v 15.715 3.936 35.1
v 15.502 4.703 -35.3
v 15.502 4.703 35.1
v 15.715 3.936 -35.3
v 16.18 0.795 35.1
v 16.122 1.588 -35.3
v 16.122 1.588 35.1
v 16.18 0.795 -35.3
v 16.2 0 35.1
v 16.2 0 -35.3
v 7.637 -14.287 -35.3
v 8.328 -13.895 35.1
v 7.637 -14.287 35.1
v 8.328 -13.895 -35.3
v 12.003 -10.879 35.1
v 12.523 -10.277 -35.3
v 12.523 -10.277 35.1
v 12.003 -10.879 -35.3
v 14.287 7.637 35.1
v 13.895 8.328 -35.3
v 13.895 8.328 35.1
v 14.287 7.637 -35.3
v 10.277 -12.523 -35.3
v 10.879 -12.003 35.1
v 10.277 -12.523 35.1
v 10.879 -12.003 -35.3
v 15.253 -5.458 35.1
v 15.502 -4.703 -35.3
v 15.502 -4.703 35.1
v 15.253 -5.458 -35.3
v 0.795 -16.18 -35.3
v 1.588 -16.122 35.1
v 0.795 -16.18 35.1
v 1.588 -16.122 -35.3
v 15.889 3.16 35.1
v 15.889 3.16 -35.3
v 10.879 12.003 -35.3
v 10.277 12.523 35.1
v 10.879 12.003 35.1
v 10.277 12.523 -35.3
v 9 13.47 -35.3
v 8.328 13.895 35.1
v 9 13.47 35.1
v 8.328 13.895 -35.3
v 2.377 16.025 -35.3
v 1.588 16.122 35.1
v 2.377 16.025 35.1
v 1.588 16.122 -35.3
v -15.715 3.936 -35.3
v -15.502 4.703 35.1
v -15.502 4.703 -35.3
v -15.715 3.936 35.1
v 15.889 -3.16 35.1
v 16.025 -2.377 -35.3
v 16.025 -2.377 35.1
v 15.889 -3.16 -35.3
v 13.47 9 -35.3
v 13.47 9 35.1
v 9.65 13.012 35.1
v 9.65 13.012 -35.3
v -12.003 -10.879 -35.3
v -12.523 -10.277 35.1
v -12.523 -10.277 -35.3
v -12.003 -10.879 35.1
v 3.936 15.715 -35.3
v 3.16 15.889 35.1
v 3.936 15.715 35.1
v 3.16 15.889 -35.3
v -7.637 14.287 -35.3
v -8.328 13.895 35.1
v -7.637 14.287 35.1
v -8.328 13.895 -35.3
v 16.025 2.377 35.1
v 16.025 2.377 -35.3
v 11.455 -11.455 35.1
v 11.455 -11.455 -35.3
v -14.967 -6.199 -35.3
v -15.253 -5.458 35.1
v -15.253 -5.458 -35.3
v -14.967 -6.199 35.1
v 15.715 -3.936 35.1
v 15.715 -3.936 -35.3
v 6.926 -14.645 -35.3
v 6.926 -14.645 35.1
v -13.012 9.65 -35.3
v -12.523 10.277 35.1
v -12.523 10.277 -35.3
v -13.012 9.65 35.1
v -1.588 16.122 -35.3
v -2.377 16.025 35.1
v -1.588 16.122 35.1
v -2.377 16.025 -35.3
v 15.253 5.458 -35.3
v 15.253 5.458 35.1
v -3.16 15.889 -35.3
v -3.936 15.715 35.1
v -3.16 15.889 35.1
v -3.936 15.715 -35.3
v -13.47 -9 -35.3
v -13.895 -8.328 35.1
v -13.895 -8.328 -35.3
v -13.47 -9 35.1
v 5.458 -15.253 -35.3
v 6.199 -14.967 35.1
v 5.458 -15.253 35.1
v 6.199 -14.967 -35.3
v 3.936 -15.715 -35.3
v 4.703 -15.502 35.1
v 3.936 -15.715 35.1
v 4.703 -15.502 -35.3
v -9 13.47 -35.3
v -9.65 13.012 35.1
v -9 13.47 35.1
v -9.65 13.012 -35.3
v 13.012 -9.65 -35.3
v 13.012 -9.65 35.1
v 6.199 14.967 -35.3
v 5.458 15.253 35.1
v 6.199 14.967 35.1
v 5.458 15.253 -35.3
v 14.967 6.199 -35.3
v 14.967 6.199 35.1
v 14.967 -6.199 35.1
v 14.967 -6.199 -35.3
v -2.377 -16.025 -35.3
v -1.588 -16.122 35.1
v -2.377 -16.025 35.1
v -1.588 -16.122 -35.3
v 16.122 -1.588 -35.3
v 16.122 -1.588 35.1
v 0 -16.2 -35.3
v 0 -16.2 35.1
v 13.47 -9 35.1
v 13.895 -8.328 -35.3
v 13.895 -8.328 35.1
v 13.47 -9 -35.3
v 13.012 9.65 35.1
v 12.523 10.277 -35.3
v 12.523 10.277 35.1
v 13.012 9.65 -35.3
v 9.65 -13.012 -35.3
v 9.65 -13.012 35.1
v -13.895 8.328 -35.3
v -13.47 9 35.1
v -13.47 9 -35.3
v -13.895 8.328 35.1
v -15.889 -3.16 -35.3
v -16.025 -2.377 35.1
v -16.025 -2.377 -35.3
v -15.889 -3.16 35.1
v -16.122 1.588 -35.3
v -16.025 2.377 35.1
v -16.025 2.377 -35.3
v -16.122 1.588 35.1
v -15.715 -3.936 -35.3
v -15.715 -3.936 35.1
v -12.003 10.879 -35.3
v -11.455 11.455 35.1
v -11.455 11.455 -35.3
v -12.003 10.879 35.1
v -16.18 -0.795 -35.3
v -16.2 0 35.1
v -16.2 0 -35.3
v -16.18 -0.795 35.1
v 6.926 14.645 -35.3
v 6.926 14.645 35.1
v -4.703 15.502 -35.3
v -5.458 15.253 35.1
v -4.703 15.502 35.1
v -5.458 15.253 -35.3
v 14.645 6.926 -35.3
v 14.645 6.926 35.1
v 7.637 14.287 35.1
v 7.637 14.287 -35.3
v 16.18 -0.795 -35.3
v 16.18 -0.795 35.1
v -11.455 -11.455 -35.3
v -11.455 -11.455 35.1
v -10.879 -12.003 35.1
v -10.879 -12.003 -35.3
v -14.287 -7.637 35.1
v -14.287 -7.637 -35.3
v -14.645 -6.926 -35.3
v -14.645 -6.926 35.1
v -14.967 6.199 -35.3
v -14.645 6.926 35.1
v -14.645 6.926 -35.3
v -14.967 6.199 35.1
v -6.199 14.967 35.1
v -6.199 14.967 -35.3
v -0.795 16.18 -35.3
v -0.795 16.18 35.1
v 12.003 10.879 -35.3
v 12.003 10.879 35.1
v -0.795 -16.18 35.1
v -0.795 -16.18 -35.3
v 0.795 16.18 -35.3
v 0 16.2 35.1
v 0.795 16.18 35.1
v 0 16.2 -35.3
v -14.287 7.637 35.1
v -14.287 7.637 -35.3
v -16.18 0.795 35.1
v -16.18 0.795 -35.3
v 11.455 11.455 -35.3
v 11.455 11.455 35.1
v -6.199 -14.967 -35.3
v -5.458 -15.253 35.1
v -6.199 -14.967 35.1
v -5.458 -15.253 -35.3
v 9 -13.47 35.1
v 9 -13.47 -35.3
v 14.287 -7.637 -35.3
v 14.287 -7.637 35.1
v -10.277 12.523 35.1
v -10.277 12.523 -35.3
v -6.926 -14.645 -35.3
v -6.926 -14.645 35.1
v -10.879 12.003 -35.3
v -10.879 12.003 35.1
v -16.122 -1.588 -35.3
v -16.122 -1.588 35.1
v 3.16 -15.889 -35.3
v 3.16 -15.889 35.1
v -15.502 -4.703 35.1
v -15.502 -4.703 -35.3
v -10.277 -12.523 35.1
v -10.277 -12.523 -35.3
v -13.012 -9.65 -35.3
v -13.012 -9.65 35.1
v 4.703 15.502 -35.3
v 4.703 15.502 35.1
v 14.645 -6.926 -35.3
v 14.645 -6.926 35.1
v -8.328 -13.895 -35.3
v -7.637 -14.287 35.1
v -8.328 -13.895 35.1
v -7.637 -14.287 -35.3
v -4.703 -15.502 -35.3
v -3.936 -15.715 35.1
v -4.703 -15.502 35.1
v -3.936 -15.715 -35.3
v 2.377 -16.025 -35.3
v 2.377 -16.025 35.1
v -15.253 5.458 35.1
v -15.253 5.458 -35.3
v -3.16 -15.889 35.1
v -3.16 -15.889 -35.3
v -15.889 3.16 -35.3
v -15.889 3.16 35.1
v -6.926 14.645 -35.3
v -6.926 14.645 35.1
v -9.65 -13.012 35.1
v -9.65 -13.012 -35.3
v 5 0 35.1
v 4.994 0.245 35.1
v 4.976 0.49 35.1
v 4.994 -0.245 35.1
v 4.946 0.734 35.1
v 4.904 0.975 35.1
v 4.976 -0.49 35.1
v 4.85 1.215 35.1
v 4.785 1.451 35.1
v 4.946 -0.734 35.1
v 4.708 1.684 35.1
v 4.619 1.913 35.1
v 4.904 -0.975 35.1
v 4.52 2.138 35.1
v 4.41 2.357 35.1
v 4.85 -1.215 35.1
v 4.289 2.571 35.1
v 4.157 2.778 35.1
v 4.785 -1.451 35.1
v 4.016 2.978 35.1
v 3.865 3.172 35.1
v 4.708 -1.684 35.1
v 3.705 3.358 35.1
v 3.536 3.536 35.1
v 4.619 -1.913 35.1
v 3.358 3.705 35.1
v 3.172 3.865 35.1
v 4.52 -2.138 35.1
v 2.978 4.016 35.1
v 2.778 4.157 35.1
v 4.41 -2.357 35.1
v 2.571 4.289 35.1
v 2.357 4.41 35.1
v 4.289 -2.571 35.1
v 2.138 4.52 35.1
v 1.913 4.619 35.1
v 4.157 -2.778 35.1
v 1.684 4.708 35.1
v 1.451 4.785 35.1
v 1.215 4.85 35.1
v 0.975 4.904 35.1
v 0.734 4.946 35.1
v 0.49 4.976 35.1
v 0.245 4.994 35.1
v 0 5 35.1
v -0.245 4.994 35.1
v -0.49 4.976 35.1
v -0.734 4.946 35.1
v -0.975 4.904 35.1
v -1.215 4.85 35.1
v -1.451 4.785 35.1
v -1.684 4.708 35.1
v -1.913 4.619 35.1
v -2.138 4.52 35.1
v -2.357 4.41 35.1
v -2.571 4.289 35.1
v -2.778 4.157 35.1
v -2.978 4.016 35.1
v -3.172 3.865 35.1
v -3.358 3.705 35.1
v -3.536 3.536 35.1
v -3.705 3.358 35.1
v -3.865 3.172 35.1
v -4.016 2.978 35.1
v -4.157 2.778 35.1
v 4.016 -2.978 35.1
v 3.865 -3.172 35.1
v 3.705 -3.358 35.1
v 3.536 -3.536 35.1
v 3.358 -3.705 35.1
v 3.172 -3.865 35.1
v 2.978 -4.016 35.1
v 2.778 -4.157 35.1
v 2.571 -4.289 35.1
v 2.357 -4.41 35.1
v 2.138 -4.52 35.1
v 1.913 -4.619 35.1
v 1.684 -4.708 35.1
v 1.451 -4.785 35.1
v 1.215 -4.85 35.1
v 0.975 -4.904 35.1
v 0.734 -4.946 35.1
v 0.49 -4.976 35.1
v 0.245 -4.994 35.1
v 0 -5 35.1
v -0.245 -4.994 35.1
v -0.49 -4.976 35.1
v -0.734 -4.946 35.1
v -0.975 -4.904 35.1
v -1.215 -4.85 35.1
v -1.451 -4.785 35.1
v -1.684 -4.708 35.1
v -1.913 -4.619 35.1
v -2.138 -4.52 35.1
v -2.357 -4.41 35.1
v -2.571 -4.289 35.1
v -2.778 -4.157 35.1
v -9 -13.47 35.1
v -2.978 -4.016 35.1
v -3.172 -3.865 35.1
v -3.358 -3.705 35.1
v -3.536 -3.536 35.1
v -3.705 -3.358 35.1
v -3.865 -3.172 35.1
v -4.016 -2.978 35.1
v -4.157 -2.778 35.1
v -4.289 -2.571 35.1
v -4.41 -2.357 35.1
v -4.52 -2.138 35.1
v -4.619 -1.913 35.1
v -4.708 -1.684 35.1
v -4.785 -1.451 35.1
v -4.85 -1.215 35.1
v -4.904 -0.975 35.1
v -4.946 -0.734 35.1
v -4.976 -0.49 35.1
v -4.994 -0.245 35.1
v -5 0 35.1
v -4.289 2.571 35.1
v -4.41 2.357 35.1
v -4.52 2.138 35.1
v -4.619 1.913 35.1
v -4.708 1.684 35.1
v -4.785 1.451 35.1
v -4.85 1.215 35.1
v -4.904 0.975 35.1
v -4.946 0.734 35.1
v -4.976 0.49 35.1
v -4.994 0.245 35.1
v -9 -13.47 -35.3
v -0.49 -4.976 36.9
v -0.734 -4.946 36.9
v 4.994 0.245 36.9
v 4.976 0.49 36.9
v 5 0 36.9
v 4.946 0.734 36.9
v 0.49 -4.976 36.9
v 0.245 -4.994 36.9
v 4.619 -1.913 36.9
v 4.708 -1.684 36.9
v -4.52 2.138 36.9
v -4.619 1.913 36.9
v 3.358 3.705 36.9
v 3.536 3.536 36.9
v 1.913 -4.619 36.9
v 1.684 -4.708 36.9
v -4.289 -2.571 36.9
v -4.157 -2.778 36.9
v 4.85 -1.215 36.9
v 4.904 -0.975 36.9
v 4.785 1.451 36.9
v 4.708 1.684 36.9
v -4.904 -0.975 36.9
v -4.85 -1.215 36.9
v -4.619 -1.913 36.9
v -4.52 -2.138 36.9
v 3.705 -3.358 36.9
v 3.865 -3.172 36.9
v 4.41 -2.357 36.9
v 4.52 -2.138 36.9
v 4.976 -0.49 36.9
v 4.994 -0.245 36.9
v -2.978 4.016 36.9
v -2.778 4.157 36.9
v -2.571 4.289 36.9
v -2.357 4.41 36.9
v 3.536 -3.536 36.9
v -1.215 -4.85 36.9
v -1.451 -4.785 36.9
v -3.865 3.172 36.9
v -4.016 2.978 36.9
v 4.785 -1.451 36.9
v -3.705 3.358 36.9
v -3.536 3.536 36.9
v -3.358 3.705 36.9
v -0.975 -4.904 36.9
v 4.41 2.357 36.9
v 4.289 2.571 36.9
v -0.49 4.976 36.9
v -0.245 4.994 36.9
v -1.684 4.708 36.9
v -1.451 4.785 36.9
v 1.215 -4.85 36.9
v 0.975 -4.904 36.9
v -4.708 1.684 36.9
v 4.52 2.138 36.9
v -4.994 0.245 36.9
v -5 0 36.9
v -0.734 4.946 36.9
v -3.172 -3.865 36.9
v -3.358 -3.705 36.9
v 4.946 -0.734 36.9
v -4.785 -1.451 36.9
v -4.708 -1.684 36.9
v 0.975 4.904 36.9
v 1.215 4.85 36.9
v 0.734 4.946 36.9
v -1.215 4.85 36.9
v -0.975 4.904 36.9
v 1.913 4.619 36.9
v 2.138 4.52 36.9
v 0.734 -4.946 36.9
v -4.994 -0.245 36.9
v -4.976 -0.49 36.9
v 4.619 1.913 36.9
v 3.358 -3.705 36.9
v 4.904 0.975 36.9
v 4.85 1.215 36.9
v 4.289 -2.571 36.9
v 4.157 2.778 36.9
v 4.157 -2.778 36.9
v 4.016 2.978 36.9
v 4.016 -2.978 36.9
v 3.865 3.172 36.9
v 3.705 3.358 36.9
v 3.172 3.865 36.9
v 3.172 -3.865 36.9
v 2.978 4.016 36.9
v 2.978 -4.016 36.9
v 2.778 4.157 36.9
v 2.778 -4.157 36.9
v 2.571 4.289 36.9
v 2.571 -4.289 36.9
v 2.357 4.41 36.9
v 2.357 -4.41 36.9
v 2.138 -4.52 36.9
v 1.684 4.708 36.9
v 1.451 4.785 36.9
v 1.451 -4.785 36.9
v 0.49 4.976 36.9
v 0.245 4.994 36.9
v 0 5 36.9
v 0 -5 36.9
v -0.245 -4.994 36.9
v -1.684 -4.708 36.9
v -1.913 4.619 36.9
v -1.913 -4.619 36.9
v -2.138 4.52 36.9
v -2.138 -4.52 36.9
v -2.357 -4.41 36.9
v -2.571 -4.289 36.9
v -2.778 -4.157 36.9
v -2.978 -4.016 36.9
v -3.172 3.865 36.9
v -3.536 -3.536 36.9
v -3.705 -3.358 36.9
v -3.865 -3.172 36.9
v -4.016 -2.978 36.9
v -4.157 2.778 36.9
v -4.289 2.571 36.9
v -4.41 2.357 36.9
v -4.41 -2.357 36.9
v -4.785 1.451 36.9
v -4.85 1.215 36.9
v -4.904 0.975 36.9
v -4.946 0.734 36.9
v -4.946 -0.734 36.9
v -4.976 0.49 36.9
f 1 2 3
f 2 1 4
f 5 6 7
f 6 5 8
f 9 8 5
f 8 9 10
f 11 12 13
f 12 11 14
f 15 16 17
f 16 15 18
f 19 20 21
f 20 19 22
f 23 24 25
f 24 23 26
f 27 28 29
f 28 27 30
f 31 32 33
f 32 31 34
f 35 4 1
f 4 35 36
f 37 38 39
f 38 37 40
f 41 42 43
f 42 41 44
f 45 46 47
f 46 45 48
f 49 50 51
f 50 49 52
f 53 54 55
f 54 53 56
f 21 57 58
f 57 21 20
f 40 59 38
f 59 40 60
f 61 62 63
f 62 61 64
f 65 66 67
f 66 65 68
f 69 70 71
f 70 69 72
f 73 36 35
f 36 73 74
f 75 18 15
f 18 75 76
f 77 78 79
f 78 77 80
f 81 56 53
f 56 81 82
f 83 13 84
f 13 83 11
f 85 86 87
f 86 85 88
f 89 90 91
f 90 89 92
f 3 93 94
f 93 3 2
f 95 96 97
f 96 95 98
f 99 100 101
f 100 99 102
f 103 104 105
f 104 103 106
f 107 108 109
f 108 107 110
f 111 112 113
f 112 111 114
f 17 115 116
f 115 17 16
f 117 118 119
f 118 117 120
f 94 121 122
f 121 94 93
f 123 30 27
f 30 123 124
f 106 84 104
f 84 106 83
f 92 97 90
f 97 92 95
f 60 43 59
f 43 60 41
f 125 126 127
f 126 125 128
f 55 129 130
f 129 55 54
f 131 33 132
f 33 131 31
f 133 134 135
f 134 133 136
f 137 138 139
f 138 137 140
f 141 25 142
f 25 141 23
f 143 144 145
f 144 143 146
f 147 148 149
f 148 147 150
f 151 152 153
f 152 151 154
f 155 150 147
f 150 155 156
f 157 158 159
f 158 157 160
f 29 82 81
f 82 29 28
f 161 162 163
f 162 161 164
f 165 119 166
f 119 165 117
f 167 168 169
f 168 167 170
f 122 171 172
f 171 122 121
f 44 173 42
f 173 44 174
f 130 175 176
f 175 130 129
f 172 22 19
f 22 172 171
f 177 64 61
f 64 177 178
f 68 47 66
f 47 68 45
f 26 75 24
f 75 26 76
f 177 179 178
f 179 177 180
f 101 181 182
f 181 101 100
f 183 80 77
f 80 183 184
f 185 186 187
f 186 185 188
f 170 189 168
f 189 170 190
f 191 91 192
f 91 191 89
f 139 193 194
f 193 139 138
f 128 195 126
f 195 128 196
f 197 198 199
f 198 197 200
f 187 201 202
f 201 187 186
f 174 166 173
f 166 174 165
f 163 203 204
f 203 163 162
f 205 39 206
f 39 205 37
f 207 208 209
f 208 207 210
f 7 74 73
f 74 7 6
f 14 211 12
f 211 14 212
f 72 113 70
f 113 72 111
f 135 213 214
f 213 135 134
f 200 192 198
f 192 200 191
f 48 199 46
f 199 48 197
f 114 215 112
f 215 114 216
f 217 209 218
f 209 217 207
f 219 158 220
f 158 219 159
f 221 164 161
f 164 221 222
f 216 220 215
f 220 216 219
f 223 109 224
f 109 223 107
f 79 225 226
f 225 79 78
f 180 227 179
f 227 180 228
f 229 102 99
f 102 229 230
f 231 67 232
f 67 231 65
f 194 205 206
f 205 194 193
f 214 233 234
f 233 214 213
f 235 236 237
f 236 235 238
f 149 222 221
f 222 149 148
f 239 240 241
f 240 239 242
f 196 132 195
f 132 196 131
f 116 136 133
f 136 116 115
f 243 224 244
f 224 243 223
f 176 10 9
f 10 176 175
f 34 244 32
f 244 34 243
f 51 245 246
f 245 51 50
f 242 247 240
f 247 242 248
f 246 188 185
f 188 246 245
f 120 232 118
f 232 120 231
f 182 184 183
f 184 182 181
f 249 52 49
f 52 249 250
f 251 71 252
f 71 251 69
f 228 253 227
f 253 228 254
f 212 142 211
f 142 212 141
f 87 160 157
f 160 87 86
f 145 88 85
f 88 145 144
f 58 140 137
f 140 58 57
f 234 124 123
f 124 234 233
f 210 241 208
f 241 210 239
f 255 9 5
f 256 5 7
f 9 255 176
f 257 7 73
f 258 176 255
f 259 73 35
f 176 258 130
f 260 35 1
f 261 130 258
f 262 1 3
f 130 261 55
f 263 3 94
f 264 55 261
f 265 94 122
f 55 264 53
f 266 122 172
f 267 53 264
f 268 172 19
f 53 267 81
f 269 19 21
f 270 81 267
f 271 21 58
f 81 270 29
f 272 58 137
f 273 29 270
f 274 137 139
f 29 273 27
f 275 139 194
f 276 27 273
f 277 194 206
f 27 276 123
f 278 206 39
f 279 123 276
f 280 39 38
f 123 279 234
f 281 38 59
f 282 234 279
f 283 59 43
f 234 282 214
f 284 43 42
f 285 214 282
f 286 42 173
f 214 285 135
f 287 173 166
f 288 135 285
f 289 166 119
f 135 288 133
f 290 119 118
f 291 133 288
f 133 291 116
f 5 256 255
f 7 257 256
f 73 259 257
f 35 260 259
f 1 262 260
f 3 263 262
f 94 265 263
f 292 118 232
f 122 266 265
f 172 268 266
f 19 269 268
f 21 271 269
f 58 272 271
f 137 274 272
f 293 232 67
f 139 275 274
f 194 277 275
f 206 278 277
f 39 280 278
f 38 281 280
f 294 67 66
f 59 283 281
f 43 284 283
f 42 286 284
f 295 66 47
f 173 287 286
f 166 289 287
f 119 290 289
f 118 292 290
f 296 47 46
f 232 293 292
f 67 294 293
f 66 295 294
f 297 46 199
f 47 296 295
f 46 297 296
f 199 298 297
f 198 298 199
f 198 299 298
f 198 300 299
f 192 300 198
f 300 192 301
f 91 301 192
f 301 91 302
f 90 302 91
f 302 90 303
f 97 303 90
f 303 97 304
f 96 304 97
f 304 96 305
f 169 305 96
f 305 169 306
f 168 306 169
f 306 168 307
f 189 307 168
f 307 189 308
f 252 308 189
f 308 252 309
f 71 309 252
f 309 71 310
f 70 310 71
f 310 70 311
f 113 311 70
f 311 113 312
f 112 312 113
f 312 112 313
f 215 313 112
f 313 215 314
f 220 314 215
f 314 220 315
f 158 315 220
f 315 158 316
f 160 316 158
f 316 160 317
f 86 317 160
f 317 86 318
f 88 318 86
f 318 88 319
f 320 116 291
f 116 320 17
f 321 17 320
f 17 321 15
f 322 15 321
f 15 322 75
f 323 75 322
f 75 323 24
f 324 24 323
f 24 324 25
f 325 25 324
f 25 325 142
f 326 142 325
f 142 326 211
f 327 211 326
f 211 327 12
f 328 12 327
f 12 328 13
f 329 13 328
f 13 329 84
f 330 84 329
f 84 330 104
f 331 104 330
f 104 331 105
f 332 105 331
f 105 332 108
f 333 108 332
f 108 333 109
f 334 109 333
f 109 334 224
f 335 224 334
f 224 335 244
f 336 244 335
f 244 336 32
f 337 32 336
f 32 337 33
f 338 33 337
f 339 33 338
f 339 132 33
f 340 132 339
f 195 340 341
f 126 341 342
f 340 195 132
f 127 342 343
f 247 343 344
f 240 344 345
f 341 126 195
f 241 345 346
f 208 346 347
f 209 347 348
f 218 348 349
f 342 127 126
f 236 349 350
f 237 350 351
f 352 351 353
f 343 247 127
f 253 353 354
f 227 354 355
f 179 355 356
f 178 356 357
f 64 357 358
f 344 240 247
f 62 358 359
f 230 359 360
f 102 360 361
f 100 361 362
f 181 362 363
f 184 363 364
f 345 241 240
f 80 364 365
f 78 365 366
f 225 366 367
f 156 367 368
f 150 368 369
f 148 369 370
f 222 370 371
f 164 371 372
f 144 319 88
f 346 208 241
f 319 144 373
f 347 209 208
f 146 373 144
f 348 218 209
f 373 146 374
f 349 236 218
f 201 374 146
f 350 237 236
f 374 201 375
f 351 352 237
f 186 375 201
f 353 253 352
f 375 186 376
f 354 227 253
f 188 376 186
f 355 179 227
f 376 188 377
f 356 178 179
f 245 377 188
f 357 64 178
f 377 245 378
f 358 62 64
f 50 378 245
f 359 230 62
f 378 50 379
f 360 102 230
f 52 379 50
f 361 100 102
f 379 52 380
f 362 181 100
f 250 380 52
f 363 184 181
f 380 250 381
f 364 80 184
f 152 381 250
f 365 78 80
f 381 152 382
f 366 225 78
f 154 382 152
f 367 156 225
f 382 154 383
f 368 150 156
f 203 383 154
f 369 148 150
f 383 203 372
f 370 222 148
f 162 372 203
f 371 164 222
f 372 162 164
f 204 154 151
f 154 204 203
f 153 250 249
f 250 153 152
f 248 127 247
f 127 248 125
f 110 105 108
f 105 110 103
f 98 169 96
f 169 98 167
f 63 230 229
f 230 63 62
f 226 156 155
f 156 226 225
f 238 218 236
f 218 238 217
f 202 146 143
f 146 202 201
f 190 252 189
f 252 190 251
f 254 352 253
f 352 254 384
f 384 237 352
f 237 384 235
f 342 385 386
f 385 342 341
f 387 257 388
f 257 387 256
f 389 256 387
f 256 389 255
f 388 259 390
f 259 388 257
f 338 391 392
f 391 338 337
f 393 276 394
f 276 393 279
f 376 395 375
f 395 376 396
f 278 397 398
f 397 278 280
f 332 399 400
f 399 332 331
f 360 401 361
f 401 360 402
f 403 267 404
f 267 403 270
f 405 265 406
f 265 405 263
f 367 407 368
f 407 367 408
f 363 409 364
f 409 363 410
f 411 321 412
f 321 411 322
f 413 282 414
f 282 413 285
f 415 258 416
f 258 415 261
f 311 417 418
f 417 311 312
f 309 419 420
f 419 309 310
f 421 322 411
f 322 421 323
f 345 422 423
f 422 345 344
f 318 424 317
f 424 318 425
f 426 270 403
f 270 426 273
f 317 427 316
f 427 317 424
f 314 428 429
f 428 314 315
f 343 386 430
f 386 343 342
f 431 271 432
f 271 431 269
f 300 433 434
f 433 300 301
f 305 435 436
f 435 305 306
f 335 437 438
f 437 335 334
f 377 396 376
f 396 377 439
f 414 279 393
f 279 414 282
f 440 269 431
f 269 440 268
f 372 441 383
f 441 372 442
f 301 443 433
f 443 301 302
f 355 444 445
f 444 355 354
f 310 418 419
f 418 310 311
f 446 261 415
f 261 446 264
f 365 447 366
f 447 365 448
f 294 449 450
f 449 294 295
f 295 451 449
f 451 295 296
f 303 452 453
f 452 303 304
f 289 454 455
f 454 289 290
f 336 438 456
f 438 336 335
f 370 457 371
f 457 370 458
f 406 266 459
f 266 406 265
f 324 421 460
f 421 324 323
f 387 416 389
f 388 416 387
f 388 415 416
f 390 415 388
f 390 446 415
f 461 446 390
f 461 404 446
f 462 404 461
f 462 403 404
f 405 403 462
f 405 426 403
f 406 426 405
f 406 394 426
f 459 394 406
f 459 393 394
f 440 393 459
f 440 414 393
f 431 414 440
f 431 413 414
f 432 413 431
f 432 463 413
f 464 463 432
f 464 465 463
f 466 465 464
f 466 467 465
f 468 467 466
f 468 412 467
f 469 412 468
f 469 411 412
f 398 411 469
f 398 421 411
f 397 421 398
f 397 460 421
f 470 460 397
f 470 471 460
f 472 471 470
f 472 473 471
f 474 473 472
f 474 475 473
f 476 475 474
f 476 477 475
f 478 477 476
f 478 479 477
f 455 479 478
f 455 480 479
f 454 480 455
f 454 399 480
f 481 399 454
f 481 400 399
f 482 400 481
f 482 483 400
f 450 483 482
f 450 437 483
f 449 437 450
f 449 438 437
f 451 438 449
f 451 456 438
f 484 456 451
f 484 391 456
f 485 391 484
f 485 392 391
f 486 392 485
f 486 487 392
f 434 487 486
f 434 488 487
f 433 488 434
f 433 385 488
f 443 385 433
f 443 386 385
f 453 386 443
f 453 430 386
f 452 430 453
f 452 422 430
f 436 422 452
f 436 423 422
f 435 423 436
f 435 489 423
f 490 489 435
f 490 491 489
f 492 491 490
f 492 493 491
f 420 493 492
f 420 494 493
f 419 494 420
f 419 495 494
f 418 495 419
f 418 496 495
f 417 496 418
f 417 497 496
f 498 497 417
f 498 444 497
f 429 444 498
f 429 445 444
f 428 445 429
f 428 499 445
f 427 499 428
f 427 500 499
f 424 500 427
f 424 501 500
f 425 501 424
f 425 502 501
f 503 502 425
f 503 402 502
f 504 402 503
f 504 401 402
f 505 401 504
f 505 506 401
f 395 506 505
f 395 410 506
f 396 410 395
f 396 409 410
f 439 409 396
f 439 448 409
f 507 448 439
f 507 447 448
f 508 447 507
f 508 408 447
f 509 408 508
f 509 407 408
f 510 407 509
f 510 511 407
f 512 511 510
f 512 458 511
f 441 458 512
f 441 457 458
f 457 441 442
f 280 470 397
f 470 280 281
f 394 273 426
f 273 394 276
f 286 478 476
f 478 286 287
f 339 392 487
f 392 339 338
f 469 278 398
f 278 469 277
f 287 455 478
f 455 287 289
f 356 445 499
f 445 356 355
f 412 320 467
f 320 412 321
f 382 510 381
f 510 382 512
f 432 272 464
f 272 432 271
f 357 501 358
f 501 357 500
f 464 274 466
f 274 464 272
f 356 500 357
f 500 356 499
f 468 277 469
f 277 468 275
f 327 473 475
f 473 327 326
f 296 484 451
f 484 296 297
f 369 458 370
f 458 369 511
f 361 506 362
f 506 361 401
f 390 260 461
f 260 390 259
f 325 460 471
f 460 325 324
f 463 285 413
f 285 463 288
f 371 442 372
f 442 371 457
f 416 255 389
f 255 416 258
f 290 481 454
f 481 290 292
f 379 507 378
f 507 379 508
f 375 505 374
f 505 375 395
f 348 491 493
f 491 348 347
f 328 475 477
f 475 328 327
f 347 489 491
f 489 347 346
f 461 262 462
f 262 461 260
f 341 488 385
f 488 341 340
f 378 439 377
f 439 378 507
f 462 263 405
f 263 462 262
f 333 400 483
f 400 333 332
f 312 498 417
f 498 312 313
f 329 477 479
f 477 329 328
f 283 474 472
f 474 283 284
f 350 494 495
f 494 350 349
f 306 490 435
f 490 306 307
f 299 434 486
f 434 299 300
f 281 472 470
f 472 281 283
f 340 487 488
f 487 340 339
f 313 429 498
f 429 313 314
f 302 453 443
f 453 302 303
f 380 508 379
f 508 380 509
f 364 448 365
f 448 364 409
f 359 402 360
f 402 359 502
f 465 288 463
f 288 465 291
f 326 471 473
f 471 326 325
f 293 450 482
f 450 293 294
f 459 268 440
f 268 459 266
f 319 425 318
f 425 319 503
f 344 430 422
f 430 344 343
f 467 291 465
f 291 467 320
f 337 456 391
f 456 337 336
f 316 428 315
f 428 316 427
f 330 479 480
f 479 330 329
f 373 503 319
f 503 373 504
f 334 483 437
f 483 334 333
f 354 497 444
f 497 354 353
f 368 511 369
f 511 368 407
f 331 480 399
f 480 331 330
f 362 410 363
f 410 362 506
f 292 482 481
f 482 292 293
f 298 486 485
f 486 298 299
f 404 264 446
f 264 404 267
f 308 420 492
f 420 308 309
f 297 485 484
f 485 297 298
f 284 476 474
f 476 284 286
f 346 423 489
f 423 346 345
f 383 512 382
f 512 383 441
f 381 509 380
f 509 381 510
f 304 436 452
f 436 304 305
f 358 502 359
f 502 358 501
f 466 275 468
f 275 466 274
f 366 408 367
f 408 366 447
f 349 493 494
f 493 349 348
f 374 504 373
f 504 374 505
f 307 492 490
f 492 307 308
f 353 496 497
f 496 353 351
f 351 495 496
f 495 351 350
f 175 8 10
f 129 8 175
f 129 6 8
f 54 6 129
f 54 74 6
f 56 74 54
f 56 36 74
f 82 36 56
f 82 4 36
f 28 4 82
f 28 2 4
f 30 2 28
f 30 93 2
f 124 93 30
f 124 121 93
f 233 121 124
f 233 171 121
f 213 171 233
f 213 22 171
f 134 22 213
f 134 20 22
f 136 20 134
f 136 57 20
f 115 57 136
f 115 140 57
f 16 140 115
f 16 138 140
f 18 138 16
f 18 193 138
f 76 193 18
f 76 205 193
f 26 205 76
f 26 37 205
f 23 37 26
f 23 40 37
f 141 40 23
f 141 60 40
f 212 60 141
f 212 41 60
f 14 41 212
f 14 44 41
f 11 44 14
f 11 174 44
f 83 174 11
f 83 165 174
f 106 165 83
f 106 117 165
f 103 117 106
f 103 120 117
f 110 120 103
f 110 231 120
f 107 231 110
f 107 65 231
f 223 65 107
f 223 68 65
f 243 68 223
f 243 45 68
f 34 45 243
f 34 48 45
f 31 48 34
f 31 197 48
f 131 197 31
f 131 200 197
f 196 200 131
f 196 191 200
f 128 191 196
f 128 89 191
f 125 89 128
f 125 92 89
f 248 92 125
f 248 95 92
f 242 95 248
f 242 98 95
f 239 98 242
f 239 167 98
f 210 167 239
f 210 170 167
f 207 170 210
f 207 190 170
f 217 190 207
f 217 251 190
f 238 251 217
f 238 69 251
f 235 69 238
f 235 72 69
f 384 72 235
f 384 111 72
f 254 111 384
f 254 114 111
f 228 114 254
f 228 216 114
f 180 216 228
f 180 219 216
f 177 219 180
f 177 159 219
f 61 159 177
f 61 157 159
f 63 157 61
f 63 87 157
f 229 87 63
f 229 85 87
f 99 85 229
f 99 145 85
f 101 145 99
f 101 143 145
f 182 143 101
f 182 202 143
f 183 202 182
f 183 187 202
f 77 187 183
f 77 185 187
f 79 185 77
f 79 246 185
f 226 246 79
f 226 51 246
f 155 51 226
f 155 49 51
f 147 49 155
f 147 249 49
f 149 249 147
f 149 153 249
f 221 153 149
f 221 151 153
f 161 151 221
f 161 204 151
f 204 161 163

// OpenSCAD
// Cylindrical battery cell model (one connected solid)

// Parameters (mm)
battery_height = 70.2;
battery_diameter = 32.4;

terminal_button_height = 2;
terminal_button_diameter = 10;

negative_terminal_height = 1;

overlap = 0.2; // small overlap to guarantee connectivity

$fn = 128;

// Main battery body
module cylindrical_cell_body() {
    cylinder(h = battery_height, d = battery_diameter, center = true);
}

// Positive terminal button (connected to top face with overlap)
module positive_terminal_button() {
    translate([0, 0, battery_height/2 + terminal_button_height/2 - overlap])
        cylinder(h = terminal_button_height, d = terminal_button_diameter, center = true);
}

// Negative terminal flat end (slightly inset so it overlaps INTO the body)
module negative_terminal_flat_end() {
    translate([0, 0, -battery_height/2 + negative_terminal_height/2 - overlap])
        cylinder(h = negative_terminal_height, d = battery_diameter, center = true);
}

// Complete battery model (single connected solid)
module battery() {
    union() {
        cylindrical_cell_body();
        positive_terminal_button();
        negative_terminal_flat_end();
    }
}

battery();
